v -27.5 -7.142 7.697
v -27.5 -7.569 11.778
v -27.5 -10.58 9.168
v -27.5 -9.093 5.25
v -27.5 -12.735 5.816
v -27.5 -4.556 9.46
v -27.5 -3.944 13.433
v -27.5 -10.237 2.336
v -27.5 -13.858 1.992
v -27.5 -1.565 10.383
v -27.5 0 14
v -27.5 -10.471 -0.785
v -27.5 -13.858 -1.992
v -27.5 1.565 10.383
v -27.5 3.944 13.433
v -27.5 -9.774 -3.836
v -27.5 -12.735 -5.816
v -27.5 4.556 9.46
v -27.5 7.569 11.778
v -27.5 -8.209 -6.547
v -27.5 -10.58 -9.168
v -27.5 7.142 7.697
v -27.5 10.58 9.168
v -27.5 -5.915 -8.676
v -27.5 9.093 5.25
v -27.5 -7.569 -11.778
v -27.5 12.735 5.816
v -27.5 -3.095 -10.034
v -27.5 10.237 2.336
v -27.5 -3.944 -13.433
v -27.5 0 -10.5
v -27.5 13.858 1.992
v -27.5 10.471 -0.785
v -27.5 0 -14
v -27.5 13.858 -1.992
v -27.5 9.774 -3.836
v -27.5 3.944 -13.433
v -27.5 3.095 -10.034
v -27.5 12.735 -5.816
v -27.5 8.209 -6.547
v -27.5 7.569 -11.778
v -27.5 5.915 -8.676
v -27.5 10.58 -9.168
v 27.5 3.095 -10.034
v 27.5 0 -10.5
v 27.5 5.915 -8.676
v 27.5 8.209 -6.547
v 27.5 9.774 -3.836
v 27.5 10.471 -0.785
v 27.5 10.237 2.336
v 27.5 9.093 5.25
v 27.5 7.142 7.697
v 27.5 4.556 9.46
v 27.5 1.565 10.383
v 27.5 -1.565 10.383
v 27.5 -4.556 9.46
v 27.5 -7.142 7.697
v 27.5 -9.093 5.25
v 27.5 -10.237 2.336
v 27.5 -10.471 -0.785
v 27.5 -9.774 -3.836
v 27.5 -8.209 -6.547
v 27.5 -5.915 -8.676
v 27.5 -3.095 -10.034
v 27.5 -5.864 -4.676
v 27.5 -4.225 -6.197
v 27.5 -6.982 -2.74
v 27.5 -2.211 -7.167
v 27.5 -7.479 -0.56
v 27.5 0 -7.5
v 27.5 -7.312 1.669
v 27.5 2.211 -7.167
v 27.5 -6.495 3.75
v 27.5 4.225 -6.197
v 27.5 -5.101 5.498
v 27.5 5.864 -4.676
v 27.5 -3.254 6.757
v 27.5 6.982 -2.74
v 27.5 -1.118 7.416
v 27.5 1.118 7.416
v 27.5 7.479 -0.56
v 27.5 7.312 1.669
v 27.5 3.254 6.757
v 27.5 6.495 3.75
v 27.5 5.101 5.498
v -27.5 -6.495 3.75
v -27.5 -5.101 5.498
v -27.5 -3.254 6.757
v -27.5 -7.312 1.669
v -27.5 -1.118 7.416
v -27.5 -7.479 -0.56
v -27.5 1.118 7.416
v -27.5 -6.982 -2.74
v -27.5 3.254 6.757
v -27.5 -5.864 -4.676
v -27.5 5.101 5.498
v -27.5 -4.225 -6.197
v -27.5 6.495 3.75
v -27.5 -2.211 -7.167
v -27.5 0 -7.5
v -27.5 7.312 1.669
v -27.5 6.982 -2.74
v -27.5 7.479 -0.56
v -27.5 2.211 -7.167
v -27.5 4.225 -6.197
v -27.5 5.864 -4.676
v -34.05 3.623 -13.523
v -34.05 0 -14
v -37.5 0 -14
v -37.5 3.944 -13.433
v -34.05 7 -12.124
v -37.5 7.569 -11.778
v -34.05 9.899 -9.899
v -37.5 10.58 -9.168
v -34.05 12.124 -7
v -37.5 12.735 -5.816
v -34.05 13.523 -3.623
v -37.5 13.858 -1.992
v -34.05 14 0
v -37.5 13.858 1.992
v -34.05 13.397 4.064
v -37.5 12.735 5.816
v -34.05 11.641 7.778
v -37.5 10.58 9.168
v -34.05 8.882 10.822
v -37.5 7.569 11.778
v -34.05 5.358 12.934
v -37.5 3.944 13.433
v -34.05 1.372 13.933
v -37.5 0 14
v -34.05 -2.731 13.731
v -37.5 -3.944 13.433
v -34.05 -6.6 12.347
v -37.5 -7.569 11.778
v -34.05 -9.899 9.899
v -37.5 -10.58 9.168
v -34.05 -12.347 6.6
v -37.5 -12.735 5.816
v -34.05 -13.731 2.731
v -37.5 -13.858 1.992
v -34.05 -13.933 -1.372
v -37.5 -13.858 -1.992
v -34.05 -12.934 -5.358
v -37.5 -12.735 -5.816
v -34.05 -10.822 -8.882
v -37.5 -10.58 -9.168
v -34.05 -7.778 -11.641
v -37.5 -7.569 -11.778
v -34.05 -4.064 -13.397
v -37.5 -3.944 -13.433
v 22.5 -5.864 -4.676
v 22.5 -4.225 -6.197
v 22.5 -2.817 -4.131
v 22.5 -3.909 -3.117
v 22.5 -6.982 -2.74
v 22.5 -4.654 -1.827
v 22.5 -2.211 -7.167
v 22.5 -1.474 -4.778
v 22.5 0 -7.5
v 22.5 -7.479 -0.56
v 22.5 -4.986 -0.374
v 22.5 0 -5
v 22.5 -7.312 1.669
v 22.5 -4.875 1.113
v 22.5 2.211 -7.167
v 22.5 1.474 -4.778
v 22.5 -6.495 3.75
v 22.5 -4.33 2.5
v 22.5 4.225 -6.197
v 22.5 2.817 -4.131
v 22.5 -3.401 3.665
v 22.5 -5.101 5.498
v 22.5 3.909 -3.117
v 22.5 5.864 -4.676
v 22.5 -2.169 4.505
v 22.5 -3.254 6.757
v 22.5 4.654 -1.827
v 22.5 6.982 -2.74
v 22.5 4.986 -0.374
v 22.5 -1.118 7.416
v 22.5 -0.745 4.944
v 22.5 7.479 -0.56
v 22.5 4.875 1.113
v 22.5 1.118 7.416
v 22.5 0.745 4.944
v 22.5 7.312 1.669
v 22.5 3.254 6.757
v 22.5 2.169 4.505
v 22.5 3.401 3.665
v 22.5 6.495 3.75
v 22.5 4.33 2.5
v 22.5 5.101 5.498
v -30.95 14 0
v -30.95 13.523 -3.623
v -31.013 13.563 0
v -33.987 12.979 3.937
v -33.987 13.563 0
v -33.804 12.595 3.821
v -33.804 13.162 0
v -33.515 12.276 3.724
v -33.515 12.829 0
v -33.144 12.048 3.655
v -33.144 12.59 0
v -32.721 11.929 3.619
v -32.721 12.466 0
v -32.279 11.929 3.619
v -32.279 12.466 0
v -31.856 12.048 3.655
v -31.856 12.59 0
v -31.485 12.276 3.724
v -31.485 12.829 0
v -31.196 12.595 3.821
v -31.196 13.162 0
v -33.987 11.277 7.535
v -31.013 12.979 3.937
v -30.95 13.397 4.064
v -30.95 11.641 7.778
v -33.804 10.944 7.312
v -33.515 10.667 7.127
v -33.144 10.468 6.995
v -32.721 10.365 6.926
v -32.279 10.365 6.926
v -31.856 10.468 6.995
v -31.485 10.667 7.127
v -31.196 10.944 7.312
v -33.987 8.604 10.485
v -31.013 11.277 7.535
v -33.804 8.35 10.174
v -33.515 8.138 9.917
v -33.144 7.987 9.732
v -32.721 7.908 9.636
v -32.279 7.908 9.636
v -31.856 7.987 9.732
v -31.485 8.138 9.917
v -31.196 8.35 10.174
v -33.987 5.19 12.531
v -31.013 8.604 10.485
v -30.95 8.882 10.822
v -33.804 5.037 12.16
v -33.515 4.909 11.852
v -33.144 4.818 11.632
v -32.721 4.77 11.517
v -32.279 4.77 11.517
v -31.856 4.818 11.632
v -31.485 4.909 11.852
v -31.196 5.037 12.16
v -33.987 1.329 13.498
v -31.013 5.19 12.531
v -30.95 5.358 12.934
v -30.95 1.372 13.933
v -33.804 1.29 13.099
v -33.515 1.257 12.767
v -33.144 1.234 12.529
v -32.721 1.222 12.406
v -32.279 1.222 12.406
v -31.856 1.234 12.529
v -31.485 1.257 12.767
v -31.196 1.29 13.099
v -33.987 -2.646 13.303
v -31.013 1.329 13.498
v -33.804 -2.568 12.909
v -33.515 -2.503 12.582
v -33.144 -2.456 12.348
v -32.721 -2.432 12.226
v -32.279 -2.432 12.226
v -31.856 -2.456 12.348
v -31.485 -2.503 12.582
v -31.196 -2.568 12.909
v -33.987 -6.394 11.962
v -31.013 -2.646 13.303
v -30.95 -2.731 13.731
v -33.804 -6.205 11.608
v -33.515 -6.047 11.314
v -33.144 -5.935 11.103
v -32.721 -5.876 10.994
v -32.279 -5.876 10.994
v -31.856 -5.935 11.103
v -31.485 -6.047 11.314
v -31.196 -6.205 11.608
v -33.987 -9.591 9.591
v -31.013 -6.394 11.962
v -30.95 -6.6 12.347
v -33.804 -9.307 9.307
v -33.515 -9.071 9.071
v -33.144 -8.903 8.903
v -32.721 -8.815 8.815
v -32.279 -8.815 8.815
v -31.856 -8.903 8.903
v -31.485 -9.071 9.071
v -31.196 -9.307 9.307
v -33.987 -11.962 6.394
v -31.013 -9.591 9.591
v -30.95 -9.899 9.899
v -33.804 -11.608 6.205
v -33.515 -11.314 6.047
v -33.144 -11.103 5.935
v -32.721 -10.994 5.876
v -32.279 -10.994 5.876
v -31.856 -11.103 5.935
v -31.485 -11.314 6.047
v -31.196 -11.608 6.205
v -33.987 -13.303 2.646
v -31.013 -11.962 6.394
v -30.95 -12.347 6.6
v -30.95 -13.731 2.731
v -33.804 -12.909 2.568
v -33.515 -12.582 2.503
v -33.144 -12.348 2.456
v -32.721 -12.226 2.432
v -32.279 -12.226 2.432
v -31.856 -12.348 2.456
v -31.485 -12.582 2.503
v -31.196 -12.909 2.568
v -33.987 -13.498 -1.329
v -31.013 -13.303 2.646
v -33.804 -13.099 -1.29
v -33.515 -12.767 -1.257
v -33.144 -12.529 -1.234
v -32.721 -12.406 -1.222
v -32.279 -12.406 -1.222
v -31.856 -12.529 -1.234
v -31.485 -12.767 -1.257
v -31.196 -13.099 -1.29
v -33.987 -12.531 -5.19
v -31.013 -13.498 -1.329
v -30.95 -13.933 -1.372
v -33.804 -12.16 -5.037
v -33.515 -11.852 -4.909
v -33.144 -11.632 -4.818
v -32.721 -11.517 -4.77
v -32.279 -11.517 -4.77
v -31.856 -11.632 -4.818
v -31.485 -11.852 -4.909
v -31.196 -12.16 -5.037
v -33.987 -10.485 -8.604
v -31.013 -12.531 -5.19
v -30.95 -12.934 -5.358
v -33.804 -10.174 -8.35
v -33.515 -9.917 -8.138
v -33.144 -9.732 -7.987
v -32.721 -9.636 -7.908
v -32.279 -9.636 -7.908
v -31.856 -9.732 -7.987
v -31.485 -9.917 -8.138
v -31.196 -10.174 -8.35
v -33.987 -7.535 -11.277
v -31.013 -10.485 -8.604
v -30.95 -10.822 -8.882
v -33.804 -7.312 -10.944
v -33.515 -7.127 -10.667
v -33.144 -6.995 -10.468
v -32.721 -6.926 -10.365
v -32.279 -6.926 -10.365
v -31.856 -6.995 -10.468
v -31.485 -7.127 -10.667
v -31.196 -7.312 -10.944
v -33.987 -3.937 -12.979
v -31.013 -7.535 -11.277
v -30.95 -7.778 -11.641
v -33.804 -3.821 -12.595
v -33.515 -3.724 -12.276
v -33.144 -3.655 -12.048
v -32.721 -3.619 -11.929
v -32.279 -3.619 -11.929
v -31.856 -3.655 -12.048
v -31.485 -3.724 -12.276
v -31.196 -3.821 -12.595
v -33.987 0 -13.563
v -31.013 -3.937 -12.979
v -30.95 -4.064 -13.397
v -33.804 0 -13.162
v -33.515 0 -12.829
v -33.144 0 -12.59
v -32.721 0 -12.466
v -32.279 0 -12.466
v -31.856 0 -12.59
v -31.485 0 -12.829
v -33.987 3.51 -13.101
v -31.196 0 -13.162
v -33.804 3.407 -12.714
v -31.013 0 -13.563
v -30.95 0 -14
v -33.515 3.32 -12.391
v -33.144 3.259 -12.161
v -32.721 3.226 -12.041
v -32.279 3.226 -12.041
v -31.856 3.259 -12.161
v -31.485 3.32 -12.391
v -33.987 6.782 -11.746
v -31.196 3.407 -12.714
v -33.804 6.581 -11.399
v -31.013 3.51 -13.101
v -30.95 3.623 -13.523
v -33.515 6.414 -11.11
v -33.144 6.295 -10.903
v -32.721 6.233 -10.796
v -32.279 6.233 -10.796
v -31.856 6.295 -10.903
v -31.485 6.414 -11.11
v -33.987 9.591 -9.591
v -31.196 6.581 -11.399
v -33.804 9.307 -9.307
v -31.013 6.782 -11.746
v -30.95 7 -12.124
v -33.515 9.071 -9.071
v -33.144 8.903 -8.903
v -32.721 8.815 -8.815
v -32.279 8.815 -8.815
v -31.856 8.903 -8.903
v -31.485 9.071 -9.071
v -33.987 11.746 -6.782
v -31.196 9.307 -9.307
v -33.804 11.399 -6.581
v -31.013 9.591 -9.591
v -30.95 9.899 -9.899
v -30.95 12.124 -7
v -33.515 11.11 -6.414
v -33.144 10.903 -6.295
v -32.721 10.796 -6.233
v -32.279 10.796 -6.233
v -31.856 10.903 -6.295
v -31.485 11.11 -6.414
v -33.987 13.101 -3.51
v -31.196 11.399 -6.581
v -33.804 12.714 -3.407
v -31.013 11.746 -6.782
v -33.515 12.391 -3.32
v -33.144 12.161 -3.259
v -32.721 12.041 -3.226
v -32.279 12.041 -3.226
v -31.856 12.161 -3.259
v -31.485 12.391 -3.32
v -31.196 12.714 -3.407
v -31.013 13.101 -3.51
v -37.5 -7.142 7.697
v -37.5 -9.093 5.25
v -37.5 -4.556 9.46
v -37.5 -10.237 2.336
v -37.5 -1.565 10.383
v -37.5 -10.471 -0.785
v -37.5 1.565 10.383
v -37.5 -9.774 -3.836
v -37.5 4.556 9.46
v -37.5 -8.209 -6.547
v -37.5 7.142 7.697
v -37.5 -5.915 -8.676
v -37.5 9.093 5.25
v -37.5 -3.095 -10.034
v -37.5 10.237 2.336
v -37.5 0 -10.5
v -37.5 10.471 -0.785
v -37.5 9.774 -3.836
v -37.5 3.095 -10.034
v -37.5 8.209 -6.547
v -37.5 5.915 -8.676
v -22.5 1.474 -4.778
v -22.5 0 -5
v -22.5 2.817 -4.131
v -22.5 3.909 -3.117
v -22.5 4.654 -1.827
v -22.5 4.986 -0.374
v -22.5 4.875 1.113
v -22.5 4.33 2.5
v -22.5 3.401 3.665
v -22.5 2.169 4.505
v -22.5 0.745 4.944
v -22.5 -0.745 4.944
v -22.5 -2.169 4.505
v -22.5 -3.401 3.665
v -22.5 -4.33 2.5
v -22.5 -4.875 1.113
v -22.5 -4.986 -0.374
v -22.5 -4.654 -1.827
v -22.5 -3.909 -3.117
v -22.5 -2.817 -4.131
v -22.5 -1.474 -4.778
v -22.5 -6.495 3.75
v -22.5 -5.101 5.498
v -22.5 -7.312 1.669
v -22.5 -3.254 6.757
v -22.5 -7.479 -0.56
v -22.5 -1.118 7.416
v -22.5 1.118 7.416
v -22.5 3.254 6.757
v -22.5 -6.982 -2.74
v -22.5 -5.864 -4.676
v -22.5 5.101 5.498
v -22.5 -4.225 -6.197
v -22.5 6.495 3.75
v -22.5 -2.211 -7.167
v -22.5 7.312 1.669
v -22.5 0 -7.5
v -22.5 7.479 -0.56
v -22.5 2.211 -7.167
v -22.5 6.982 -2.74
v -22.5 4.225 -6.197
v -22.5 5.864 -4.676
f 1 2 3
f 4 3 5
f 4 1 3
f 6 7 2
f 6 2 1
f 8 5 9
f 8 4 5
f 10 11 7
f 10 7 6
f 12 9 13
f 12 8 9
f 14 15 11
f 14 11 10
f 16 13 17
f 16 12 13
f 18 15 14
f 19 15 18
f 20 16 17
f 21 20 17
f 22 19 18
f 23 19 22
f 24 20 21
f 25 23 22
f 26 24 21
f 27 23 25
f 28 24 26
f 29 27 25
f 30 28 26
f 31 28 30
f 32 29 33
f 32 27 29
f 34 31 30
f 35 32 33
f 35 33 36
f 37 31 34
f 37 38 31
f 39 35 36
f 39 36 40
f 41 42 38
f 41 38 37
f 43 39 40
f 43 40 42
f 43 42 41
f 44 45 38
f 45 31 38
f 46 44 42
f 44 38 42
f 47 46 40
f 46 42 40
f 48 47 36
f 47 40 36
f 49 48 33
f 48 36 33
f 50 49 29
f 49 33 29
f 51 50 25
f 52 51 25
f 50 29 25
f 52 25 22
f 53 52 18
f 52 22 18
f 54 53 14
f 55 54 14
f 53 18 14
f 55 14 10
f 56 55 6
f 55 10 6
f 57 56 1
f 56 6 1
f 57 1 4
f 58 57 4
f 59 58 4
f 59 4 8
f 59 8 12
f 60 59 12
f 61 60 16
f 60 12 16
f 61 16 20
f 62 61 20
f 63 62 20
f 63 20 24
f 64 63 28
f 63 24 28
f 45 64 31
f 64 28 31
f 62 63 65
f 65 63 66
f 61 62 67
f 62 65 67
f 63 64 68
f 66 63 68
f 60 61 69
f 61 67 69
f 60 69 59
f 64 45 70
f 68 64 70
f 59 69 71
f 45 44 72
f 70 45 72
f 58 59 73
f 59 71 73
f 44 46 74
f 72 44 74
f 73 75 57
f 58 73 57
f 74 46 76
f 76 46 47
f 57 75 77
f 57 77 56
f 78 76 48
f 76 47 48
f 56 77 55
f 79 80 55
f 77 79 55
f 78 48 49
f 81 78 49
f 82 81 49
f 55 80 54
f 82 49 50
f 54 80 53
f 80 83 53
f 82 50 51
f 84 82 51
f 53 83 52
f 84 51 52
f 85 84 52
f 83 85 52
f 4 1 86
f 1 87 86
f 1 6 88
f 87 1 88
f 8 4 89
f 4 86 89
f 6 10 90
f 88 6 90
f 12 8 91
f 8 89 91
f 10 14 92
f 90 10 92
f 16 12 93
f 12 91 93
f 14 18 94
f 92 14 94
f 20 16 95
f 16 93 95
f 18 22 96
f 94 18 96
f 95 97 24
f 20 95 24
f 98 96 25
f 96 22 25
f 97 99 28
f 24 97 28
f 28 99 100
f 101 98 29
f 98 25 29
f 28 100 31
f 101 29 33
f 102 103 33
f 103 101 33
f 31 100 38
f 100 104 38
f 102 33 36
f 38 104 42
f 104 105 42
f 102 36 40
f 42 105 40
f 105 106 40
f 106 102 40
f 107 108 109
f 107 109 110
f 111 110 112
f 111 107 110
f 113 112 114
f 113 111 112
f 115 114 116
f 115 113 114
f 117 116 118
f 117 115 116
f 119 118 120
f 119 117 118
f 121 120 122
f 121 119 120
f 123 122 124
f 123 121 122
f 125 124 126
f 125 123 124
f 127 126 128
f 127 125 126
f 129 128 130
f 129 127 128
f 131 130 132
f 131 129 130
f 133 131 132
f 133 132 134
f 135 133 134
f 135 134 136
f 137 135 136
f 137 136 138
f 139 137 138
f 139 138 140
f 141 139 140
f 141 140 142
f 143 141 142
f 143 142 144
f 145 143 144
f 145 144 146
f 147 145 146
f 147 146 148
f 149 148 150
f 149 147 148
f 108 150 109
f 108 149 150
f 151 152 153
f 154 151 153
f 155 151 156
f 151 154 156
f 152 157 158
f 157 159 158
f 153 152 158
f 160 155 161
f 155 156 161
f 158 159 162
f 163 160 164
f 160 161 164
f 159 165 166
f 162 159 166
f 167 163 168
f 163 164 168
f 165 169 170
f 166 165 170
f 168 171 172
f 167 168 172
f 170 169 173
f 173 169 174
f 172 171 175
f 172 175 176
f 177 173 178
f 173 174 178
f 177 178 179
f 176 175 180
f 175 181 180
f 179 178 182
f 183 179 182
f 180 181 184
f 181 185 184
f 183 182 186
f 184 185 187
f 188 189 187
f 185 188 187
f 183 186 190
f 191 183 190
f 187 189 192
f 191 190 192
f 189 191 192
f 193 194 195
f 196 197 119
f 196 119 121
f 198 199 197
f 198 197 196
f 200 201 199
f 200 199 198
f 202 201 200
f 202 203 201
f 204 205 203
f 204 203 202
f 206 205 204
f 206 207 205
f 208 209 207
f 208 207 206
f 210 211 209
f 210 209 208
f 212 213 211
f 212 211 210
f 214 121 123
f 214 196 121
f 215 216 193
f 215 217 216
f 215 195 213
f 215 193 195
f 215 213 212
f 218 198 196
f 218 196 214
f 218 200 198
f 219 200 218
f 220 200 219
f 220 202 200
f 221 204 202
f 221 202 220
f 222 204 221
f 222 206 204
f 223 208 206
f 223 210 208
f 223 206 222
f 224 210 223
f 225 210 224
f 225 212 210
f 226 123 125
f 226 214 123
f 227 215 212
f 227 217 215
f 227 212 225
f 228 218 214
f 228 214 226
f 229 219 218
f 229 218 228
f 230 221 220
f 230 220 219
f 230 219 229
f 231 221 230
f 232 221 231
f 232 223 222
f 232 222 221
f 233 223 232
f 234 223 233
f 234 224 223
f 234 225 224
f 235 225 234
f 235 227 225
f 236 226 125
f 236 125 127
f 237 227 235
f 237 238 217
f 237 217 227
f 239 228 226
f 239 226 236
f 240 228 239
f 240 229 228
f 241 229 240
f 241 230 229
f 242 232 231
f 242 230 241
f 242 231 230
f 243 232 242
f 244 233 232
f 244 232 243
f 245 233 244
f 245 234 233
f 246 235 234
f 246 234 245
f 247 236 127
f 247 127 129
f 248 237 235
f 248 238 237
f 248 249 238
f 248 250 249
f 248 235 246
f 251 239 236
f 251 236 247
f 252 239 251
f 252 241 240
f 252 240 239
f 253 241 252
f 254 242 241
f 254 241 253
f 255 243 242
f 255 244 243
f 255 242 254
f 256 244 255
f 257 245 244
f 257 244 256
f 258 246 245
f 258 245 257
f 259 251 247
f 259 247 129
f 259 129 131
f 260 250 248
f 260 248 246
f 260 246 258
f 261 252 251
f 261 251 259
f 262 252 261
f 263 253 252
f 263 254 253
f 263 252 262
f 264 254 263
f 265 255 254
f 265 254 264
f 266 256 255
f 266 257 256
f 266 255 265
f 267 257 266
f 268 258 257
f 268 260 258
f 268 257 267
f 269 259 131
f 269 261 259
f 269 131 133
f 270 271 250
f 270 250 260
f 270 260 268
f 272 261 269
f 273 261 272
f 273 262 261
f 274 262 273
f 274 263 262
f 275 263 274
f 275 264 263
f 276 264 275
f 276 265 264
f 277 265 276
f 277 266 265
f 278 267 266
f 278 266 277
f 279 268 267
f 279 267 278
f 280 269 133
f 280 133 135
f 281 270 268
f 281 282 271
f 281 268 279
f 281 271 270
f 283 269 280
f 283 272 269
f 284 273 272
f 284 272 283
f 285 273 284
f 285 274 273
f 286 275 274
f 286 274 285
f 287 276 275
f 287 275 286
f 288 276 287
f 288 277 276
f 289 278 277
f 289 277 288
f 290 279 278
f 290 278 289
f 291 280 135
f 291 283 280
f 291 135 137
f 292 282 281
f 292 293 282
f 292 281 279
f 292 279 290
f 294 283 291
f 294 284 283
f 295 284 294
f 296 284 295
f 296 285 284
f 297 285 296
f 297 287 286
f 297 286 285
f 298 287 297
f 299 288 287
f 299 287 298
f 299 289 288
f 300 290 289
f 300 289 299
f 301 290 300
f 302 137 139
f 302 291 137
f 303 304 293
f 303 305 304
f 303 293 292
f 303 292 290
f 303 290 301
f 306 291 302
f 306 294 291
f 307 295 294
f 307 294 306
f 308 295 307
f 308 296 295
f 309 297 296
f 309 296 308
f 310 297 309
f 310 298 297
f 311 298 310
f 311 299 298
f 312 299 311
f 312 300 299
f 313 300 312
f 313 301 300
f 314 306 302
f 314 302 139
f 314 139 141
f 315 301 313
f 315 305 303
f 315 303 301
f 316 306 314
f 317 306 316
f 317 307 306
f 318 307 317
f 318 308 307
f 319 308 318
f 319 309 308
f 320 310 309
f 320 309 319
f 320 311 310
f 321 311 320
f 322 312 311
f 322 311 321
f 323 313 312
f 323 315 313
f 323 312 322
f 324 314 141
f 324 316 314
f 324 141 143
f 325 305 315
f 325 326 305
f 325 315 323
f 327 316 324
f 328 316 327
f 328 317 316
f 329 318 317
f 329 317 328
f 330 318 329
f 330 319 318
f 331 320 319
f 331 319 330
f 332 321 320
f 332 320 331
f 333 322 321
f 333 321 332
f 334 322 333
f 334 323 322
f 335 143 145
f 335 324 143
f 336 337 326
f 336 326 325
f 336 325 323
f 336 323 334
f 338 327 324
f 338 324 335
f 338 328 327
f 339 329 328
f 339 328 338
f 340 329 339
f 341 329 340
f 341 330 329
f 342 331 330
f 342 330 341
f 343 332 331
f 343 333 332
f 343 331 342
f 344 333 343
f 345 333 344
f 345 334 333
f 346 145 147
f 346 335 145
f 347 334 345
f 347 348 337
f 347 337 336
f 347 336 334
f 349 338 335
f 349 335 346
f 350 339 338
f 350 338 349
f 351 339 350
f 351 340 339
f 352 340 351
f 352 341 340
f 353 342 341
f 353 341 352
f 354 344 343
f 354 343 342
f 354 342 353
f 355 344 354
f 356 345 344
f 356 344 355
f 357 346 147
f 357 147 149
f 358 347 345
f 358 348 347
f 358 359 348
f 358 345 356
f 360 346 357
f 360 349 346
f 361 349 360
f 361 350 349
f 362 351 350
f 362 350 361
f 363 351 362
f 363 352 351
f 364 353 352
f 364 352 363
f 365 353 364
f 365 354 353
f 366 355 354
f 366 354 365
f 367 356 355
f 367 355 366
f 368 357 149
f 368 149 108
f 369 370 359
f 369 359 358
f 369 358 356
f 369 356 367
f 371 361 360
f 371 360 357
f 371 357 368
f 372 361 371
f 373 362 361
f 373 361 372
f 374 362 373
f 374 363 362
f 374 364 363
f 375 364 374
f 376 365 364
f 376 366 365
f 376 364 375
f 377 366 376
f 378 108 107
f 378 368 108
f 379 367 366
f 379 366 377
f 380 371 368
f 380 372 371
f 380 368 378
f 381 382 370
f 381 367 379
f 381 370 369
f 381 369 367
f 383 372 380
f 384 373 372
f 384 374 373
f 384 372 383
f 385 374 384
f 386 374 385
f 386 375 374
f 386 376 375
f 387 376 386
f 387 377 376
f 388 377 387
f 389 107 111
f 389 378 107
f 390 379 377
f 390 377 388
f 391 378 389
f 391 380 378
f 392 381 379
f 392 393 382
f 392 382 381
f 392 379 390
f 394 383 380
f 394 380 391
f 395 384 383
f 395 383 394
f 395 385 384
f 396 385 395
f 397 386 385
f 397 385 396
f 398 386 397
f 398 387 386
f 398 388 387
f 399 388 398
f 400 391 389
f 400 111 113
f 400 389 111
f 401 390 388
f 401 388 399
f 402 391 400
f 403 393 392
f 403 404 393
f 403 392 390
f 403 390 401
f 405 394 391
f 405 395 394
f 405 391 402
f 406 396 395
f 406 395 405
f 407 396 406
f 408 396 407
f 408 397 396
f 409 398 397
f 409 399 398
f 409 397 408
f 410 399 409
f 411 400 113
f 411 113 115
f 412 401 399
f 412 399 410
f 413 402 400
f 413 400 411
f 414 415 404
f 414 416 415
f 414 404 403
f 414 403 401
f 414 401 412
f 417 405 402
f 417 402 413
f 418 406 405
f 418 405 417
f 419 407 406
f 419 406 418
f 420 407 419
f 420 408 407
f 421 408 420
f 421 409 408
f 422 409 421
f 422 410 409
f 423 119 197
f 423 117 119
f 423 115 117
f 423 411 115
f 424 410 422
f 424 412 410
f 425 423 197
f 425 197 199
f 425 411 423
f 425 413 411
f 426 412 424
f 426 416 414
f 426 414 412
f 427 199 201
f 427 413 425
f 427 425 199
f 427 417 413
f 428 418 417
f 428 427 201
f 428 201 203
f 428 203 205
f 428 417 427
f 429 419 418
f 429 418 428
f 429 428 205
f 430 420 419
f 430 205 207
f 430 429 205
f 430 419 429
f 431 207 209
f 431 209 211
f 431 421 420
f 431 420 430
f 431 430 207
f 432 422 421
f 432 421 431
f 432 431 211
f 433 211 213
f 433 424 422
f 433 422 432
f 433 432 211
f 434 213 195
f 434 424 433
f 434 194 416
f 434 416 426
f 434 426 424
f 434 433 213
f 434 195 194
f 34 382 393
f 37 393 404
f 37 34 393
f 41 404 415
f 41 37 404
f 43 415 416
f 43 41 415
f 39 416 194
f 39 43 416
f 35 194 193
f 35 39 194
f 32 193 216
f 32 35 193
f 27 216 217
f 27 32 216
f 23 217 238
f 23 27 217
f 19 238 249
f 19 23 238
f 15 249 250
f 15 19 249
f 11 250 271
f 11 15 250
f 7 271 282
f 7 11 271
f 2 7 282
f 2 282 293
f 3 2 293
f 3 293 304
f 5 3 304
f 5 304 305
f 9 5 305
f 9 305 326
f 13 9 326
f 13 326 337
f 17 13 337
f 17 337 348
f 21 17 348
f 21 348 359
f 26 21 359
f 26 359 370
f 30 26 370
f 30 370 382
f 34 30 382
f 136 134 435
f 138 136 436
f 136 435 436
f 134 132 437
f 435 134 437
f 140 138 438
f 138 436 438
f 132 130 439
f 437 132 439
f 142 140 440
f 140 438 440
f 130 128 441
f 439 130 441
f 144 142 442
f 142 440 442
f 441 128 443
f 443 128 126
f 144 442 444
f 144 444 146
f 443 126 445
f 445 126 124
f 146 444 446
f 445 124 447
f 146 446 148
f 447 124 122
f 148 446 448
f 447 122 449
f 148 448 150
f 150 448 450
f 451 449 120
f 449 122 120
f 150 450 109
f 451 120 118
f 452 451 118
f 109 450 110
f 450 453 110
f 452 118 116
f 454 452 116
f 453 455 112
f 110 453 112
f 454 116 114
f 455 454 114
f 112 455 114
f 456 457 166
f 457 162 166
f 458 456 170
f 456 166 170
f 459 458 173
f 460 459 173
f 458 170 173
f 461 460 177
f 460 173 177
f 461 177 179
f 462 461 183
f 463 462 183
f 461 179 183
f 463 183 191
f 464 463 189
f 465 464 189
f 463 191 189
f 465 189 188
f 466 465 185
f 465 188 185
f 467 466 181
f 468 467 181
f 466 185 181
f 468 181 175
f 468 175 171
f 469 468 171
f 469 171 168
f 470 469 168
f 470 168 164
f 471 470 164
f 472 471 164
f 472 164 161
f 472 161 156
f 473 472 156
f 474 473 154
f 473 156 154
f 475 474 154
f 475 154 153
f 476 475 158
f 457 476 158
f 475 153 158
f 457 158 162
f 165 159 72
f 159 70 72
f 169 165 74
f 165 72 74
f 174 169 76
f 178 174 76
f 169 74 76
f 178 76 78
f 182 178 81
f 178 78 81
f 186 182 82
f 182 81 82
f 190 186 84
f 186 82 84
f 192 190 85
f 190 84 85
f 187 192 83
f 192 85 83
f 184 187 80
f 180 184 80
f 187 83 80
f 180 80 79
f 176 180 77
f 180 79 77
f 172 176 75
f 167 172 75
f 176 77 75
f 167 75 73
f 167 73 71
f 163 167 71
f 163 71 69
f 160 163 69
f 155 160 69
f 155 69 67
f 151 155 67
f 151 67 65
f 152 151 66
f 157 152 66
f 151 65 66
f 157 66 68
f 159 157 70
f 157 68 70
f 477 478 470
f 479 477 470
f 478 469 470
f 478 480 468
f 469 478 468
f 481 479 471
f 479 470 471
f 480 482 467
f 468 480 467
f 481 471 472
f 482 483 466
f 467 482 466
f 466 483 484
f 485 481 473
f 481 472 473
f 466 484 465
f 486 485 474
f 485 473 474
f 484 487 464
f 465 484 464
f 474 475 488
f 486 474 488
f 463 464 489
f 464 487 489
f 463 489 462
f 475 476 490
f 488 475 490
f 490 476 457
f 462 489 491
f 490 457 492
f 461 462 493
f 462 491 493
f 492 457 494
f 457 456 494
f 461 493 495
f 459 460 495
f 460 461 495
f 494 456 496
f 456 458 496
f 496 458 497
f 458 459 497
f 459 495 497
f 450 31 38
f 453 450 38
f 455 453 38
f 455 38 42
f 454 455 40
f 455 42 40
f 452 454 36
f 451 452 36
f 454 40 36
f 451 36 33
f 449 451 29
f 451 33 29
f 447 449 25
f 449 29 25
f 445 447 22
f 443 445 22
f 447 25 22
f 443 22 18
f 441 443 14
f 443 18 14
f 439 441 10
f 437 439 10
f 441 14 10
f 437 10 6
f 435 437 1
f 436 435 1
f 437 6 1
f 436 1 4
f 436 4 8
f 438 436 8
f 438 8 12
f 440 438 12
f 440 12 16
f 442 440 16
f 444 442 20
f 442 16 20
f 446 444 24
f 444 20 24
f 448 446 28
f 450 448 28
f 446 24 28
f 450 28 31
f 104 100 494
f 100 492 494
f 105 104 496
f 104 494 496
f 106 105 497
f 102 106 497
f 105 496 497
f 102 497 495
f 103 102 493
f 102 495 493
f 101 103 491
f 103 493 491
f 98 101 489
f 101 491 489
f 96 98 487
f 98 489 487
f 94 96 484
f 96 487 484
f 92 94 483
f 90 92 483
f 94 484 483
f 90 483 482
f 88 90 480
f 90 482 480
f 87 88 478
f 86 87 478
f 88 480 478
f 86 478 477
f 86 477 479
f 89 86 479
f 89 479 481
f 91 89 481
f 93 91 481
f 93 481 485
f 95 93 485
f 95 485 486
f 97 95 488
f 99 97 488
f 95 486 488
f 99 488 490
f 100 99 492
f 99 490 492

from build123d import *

# Parameters (mm, degrees)
SKETCH2_R           = 14
SKETCH2_R_2         = 10.5
BOSS_EXTRUDE1_DEPTH = 10
SKETCH3_R           = 1.55


with BuildPart() as part:
    # Sketch1 → Revolve1 (revolve)
    with BuildSketch(Plane(origin=(0, 0, 0), x_dir=(1, 0, 0), z_dir=(0, 1, 0))):
        Polygon((-22.5, 7.5), (-22.5, 5), (22.5, 5), (22.5, 7.5), (27.5, 7.5), (27.5, 10.5), (-27.5, 10.5), (-27.5, 7.5), align=None)
    revolve(axis=Axis((-27.5, 0, 0), (1, 0, 0)))


with BuildPart() as body_2:
    # Sketch2 → Boss-Extrude1 (new body)
    with BuildSketch(Plane(origin=(-27.5, 0, 0), x_dir=(0, 0, -1), z_dir=(1, 0, 0))):
        Circle(SKETCH2_R)
        Circle(SKETCH2_R_2, mode=Mode.SUBTRACT)
    extrude(amount=-BOSS_EXTRUDE1_DEPTH)

    # Sketch3 → Cut-Revolve2 (revolve, cut)
    with BuildSketch(Plane.XY):
        with Locations((-32.5, 14)):
            Circle(SKETCH3_R)
    revolve(axis=Axis((0, 0, 0), (1, 0, 0)), mode=Mode.SUBTRACT)


solid = Compound([part.part, body_2.part])
